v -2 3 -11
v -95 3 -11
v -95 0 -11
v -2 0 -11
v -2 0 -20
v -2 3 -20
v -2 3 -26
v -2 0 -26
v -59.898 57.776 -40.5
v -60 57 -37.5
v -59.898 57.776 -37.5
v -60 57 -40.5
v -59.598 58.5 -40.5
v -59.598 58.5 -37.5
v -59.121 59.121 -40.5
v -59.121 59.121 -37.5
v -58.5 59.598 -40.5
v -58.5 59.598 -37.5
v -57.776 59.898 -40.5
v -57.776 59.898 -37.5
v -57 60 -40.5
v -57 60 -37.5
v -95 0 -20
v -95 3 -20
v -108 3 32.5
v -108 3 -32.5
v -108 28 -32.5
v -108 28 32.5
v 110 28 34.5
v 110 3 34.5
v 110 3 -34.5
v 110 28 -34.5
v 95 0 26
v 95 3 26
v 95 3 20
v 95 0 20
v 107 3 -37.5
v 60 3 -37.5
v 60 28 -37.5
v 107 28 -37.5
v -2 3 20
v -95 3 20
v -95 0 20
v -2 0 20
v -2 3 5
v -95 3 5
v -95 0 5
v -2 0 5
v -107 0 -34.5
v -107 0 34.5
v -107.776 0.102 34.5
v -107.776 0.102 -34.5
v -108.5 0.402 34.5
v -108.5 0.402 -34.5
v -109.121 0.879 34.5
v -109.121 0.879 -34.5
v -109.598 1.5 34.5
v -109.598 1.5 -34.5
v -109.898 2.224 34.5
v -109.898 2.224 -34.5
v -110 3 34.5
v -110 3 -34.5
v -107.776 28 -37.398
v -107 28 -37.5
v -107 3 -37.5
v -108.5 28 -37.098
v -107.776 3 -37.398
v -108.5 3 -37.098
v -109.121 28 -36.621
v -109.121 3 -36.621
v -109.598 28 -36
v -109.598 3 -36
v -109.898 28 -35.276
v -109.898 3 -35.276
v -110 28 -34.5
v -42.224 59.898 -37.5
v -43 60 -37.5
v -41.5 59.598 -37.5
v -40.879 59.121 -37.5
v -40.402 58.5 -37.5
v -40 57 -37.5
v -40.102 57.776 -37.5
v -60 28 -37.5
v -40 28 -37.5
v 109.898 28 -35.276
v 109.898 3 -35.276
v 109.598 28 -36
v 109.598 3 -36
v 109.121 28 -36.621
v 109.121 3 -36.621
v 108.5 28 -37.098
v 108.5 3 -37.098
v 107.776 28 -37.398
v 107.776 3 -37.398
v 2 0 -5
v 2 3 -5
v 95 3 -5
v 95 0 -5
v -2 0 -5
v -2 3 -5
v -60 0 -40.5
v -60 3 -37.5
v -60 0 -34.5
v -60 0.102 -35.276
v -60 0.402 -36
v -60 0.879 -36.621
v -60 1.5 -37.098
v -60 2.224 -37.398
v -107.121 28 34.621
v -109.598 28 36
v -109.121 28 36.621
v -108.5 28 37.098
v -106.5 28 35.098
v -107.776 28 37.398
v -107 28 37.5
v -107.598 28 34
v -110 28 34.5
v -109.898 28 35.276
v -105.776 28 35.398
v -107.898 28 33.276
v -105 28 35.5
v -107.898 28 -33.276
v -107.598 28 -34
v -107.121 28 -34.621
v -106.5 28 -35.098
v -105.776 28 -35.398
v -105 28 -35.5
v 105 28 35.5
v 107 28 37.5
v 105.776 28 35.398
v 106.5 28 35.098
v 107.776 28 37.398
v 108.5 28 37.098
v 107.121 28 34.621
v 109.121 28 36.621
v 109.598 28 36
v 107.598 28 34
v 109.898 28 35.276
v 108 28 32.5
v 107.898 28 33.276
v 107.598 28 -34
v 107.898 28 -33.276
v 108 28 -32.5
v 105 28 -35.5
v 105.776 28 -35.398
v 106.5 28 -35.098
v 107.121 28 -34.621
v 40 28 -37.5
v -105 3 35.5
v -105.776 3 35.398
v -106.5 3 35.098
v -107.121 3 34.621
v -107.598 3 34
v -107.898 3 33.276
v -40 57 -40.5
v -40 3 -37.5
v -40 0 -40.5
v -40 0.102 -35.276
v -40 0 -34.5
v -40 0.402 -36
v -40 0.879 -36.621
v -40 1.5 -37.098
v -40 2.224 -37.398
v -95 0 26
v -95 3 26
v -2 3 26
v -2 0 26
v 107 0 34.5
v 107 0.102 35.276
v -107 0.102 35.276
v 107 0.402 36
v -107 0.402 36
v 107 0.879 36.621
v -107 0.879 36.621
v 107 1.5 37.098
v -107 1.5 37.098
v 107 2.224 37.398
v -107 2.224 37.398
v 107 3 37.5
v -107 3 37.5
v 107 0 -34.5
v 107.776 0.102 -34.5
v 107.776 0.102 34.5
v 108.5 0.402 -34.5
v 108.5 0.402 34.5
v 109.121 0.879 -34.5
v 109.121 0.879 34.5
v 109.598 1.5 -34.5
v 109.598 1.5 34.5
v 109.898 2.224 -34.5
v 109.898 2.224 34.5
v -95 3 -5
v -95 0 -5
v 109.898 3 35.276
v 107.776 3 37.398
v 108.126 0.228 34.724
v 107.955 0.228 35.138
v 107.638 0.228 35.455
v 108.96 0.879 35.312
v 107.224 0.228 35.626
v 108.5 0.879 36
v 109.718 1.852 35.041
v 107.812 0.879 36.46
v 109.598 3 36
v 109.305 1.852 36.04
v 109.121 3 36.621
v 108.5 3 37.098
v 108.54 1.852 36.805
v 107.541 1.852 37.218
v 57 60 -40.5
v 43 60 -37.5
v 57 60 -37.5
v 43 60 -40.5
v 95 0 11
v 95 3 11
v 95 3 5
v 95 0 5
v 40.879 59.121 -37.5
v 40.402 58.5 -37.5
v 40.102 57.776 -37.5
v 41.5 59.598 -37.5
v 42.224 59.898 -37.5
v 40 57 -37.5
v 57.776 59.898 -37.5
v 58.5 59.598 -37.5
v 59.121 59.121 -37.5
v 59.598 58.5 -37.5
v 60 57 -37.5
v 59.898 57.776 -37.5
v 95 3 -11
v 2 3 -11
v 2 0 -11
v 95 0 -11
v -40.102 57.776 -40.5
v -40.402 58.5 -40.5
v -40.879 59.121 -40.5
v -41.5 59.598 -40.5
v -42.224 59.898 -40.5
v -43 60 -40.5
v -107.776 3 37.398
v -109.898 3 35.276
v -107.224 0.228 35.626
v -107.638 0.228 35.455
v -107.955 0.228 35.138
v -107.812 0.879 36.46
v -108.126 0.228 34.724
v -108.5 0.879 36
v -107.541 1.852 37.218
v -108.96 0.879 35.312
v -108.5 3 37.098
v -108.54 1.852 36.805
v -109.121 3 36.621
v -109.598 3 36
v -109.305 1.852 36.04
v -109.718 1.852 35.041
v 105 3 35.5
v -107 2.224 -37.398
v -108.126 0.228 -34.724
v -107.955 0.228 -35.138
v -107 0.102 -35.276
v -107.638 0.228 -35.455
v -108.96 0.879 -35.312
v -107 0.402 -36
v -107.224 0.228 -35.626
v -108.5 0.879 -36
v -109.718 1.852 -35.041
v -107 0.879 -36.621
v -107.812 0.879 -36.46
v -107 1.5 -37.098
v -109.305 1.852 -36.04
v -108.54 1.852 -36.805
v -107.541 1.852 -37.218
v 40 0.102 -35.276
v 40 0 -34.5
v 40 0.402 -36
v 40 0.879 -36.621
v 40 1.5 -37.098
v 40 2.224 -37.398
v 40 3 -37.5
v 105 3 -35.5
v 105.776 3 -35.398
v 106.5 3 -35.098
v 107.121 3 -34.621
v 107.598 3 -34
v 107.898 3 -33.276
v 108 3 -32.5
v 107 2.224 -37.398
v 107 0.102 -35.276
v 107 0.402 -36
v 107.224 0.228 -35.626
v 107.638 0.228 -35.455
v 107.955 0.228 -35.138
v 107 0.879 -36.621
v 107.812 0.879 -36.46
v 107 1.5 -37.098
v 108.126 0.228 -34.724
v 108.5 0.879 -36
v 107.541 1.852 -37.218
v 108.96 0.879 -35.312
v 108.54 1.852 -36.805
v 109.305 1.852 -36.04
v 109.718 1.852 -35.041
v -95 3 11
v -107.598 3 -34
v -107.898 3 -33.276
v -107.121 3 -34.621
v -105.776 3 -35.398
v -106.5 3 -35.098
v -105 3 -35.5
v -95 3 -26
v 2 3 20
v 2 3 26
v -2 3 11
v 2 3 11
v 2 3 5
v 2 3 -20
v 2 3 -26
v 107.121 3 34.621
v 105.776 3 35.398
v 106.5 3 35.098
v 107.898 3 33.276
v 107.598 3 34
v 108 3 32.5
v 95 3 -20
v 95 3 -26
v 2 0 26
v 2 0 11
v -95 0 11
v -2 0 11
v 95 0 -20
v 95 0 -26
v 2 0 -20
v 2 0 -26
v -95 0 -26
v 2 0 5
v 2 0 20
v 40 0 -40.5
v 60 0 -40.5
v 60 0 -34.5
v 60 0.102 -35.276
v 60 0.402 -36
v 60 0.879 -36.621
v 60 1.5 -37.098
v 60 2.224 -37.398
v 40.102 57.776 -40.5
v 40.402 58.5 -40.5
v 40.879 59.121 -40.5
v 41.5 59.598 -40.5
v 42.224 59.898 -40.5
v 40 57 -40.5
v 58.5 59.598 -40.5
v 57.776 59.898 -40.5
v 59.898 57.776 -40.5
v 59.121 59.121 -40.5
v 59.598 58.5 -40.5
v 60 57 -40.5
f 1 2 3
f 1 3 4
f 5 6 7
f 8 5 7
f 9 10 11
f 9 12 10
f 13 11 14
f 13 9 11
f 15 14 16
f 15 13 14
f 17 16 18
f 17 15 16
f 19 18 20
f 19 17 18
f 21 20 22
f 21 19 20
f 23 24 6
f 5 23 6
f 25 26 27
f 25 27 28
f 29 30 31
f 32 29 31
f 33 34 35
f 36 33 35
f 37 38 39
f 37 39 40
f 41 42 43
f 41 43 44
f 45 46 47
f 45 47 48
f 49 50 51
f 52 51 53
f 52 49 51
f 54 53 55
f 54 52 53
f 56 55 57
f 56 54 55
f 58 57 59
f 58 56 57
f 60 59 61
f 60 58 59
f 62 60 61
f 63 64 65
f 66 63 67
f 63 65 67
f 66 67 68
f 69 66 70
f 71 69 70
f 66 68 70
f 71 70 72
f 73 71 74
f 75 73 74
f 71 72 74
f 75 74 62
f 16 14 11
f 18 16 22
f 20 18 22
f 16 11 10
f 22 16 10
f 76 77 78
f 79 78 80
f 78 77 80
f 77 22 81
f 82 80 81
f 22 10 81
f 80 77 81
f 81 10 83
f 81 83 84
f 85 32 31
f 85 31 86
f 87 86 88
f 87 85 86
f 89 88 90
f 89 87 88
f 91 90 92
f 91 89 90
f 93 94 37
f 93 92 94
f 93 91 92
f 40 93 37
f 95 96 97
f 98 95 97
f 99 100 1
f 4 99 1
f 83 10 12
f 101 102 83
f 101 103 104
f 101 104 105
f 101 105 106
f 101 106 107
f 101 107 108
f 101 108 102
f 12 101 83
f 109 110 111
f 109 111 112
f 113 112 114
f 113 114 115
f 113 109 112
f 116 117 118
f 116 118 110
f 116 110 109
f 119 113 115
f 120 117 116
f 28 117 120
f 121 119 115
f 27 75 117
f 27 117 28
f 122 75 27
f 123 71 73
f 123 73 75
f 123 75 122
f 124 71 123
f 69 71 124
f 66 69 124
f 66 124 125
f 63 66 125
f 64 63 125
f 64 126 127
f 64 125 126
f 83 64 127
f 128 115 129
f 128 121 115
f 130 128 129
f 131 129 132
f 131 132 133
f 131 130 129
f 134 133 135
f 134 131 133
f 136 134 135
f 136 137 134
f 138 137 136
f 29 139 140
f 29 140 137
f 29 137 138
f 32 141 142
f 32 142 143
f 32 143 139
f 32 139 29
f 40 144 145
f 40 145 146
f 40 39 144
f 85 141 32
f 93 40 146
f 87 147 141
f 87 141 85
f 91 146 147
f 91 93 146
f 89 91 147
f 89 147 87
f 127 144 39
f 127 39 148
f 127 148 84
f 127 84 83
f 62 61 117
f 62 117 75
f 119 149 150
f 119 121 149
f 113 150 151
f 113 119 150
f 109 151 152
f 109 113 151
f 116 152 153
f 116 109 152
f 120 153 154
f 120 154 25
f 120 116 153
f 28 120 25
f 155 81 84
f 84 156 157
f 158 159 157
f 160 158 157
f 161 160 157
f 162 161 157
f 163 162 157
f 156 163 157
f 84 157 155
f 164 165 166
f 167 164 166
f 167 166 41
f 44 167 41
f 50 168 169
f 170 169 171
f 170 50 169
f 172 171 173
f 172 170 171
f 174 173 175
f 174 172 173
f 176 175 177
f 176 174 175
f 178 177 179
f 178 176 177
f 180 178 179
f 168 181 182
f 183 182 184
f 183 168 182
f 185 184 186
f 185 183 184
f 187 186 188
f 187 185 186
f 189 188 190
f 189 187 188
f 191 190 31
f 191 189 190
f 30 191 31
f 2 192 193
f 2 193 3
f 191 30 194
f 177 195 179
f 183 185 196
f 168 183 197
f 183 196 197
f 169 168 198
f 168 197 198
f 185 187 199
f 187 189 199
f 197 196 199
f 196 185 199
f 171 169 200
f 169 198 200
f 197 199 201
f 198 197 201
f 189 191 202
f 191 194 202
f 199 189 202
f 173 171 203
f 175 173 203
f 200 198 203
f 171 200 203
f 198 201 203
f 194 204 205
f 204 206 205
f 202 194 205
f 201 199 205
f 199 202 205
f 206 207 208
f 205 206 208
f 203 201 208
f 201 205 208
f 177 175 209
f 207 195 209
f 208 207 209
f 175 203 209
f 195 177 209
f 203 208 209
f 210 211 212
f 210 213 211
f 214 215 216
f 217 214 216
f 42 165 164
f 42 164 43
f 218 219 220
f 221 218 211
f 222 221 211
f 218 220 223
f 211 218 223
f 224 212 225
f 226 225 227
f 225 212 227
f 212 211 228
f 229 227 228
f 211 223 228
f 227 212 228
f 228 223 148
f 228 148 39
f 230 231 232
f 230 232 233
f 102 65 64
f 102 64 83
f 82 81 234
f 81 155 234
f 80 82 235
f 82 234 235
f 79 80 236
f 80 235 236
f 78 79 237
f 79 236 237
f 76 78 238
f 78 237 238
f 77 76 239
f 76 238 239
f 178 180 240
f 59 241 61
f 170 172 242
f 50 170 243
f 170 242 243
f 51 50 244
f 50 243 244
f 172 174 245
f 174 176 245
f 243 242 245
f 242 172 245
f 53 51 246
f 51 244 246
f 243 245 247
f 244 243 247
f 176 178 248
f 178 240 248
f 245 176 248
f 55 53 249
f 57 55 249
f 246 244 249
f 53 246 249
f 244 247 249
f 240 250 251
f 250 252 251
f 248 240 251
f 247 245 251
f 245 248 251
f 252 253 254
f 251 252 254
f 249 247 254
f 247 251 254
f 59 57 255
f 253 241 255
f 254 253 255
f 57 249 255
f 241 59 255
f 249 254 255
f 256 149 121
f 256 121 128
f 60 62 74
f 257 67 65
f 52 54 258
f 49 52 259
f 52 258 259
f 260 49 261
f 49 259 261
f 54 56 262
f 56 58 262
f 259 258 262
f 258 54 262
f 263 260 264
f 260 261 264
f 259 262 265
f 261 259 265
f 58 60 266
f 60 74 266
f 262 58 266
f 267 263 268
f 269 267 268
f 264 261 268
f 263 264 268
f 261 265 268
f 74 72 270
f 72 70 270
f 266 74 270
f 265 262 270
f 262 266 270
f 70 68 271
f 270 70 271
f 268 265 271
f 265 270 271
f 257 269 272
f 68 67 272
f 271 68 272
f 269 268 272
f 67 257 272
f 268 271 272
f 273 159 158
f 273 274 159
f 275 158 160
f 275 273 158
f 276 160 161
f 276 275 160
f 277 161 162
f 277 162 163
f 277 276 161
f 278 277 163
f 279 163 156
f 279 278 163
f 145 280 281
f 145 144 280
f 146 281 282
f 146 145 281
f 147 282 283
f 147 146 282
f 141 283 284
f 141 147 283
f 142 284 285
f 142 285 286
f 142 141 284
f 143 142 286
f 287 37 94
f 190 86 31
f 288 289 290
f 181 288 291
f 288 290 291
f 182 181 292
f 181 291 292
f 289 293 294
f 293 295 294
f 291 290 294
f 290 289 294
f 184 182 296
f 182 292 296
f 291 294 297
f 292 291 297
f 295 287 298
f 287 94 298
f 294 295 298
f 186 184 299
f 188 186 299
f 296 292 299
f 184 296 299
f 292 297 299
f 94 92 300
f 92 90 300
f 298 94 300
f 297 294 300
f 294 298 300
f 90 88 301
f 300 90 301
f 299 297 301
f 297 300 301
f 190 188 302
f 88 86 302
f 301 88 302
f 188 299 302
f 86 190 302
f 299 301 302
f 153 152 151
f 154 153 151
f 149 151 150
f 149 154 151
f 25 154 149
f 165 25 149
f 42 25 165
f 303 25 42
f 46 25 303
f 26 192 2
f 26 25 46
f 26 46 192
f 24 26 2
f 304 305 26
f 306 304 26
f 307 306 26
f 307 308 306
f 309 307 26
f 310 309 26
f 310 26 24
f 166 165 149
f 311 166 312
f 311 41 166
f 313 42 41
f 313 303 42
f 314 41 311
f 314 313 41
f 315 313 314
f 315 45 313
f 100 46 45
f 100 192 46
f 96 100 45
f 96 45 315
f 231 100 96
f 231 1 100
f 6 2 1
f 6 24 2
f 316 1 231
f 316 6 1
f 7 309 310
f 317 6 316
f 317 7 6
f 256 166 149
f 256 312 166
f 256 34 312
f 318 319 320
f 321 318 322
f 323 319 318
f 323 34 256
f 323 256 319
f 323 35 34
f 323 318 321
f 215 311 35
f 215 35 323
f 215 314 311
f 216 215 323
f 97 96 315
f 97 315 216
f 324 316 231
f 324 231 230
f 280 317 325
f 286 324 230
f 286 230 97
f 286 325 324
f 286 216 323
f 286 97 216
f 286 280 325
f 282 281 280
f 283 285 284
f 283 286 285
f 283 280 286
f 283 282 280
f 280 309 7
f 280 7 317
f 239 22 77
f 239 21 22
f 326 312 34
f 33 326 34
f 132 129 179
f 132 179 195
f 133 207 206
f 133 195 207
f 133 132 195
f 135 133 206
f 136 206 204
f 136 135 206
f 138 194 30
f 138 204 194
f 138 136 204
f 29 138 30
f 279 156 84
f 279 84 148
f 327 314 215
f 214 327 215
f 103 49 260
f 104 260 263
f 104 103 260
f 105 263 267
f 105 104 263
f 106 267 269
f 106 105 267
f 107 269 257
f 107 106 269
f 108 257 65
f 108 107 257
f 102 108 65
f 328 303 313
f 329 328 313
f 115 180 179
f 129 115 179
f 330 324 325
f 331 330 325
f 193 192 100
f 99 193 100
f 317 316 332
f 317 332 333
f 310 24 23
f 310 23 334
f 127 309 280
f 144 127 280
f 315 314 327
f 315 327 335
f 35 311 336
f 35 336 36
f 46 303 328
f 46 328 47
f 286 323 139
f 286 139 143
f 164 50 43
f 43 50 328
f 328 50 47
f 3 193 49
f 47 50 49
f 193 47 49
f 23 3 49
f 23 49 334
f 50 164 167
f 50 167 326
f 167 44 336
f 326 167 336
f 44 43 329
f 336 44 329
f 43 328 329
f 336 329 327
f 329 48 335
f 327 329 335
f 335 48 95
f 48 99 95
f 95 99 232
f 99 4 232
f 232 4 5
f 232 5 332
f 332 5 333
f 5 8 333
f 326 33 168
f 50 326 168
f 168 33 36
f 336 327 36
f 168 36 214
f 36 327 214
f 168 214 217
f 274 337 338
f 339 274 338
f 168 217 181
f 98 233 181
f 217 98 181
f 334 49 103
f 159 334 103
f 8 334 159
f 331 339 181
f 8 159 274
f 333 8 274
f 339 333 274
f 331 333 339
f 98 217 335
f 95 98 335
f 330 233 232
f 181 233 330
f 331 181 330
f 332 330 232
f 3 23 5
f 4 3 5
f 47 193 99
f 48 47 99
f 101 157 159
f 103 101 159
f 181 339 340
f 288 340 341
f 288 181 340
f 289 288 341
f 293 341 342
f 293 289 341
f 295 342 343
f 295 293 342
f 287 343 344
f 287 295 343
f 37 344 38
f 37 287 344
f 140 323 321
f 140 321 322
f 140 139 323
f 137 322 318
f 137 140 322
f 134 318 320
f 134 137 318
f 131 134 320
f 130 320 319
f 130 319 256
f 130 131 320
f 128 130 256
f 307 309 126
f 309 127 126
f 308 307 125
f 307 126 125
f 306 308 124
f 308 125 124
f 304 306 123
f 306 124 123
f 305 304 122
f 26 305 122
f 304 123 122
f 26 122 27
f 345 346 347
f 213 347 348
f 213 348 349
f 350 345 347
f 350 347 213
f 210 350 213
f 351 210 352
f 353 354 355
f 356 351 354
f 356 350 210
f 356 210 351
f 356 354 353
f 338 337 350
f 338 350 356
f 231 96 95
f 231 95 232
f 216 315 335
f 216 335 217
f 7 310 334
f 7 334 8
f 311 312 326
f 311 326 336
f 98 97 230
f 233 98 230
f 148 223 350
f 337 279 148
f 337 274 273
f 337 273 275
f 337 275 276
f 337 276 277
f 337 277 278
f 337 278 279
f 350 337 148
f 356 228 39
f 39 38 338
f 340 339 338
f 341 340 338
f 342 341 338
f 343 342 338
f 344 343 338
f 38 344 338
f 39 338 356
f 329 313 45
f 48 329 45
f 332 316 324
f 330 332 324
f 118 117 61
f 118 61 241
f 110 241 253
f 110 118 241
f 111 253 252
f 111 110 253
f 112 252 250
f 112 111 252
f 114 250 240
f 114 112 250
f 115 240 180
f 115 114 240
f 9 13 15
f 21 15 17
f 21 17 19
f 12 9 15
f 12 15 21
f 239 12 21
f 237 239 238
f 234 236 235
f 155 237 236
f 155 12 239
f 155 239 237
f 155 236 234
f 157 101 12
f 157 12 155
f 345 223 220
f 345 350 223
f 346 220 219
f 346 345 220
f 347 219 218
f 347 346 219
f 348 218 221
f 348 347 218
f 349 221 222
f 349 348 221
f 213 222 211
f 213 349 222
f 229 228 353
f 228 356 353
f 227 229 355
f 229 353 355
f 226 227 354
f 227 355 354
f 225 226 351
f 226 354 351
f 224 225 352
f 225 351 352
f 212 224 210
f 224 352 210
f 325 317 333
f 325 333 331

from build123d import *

# Parameters (mm, degrees)
SKIZZE1_W                       = 220
SKIZZE1_H                       = 75
AUFSATZ_LINEAR_AUSTRAGEN1_DEPTH = 3
SKIZZE3_W                       = 20
SKIZZE3_H                       = 3
AUFSATZ_LINEAR_AUSTRAGEN3_DEPTH = 60
SKIZZE4_W                       = 220
SKIZZE4_H                       = 75
AUFSATZ_LINEAR_AUSTRAGEN4_DEPTH = 25
SKIZZE5_W                       = 190
SKIZZE5_H                       = 6
SCHNITT_LINEAR_AUSTRAGEN1_DEPTH = 131.342817217
SKIZZE6_W                       = 4
SKIZZE6_H                       = 52
AUFSATZ_LINEAR_AUSTRAGEN5_DEPTH = 3
VERRUNDUNG1_R                   = 3
VERRUNDUNG2_R                   = 3
VERRUNDUNG3_R                   = 3
VERRUNDUNG4_R                   = 3


with BuildPart() as part:
    # Skizze1 → Aufsatz-Linear austragen1 (new body)
    with BuildSketch(Plane(origin=(0, 0, 0), x_dir=(1, 0, 0), z_dir=(0, 1, 0))):
        Rectangle(SKIZZE1_W, SKIZZE1_H)
    extrude(amount=AUFSATZ_LINEAR_AUSTRAGEN1_DEPTH)

    # Skizze3 → Aufsatz-Linear austragen3 (add)
    with BuildSketch(Plane(origin=(0, 0, 0), x_dir=(1, 0, 0), z_dir=(0, 1, 0))):
        with Locations((50, 39)):
            Rectangle(SKIZZE3_W, SKIZZE3_H)
        with Locations((-50, 39)):
            Rectangle(SKIZZE3_W, SKIZZE3_H)
    extrude(amount=AUFSATZ_LINEAR_AUSTRAGEN3_DEPTH)

    # Skizze4 → Aufsatz-Linear austragen4 (add)
    with BuildSketch(Plane(origin=(0, 3, 0), x_dir=(1, 0, 0), z_dir=(0, 1, 0))):
        Rectangle(SKIZZE4_W, SKIZZE4_H)
        Polygon((108, 35.5), (60, 35.5), (40, 35.5), (-40, 35.5), (-60, 35.5), (-108, 35.5), (-108, -35.5), (108, -35.5), align=None, mode=Mode.SUBTRACT)
    extrude(amount=AUFSATZ_LINEAR_AUSTRAGEN4_DEPTH)

    # Skizze5 → Schnitt-Linear austragen1 (cut, through all)
    with BuildSketch(Plane(origin=(0, 3, 0), x_dir=(1, 0, 0), z_dir=(0, 1, 0))):
        with Locations((0, 23)):
            Rectangle(SKIZZE5_W, SKIZZE5_H)
        with Locations((0, 8)):
            Rectangle(SKIZZE5_W, SKIZZE5_H)
        with Locations((0, -8)):
            Rectangle(SKIZZE5_W, SKIZZE5_H)
        with Locations((0, -23)):
            Rectangle(SKIZZE5_W, SKIZZE5_H)
    extrude(amount=-SCHNITT_LINEAR_AUSTRAGEN1_DEPTH, mode=Mode.SUBTRACT)

    # Skizze6 → Aufsatz-Linear austragen5 (add, through all)
    with BuildSketch(Plane(origin=(0, 3, 0), x_dir=(1, 0, 0), z_dir=(0, 1, 0))):
        Rectangle(SKIZZE6_W, SKIZZE6_H)
    extrude(amount=-AUFSATZ_LINEAR_AUSTRAGEN5_DEPTH)

    # Verrundung1
    verrundung1_edges = [part.edges().sort_by_distance(p)[0] for p in [
        (40, 60, -39),
        (60, 60, -39),
        (-40, 60, -39),
        (-60, 60, -39),
    ]]
    fillet(verrundung1_edges, radius=VERRUNDUNG1_R)

    # Verrundung2
    verrundung2_edges = [part.edges().sort_by_distance(p)[0] for p in [
        (108, 15.5, -35.5),
        (-108, 15.5, -35.5),
        (-108, 15.5, 35.5),
        (108, 15.5, 35.5),
        (110, 14, -37.5),
        (110, 14, 37.5),
        (-110, 14, 37.5),
        (-110, 14, -37.5),
    ]]
    fillet(verrundung2_edges, radius=VERRUNDUNG2_R)

    # Verrundung3
    verrundung3_edges = [part.edges().sort_by_distance(p)[0] for p in [
        (-110, 0, 0),
        (83.5, 0, -37.5),
        (110, 0, 0),
        (0, 0, 37.5),
        (109.121320344, 0, 36.621320344),
        (109.121320344, 0, -36.621320344),
        (-109.121320344, 0, 36.621320344),
        (-109.121320344, 0, -36.621320344),
        (-83.5, 0, -37.5),
    ]]
    fillet(verrundung3_edges, radius=VERRUNDUNG3_R)

    # Verrundung4
    verrundung4_edges = [part.edges().sort_by_distance(p)[0] for p in [
        (0, 0, -37.5),
    ]]
    fillet(verrundung4_edges, radius=VERRUNDUNG4_R)


solid = part.part
